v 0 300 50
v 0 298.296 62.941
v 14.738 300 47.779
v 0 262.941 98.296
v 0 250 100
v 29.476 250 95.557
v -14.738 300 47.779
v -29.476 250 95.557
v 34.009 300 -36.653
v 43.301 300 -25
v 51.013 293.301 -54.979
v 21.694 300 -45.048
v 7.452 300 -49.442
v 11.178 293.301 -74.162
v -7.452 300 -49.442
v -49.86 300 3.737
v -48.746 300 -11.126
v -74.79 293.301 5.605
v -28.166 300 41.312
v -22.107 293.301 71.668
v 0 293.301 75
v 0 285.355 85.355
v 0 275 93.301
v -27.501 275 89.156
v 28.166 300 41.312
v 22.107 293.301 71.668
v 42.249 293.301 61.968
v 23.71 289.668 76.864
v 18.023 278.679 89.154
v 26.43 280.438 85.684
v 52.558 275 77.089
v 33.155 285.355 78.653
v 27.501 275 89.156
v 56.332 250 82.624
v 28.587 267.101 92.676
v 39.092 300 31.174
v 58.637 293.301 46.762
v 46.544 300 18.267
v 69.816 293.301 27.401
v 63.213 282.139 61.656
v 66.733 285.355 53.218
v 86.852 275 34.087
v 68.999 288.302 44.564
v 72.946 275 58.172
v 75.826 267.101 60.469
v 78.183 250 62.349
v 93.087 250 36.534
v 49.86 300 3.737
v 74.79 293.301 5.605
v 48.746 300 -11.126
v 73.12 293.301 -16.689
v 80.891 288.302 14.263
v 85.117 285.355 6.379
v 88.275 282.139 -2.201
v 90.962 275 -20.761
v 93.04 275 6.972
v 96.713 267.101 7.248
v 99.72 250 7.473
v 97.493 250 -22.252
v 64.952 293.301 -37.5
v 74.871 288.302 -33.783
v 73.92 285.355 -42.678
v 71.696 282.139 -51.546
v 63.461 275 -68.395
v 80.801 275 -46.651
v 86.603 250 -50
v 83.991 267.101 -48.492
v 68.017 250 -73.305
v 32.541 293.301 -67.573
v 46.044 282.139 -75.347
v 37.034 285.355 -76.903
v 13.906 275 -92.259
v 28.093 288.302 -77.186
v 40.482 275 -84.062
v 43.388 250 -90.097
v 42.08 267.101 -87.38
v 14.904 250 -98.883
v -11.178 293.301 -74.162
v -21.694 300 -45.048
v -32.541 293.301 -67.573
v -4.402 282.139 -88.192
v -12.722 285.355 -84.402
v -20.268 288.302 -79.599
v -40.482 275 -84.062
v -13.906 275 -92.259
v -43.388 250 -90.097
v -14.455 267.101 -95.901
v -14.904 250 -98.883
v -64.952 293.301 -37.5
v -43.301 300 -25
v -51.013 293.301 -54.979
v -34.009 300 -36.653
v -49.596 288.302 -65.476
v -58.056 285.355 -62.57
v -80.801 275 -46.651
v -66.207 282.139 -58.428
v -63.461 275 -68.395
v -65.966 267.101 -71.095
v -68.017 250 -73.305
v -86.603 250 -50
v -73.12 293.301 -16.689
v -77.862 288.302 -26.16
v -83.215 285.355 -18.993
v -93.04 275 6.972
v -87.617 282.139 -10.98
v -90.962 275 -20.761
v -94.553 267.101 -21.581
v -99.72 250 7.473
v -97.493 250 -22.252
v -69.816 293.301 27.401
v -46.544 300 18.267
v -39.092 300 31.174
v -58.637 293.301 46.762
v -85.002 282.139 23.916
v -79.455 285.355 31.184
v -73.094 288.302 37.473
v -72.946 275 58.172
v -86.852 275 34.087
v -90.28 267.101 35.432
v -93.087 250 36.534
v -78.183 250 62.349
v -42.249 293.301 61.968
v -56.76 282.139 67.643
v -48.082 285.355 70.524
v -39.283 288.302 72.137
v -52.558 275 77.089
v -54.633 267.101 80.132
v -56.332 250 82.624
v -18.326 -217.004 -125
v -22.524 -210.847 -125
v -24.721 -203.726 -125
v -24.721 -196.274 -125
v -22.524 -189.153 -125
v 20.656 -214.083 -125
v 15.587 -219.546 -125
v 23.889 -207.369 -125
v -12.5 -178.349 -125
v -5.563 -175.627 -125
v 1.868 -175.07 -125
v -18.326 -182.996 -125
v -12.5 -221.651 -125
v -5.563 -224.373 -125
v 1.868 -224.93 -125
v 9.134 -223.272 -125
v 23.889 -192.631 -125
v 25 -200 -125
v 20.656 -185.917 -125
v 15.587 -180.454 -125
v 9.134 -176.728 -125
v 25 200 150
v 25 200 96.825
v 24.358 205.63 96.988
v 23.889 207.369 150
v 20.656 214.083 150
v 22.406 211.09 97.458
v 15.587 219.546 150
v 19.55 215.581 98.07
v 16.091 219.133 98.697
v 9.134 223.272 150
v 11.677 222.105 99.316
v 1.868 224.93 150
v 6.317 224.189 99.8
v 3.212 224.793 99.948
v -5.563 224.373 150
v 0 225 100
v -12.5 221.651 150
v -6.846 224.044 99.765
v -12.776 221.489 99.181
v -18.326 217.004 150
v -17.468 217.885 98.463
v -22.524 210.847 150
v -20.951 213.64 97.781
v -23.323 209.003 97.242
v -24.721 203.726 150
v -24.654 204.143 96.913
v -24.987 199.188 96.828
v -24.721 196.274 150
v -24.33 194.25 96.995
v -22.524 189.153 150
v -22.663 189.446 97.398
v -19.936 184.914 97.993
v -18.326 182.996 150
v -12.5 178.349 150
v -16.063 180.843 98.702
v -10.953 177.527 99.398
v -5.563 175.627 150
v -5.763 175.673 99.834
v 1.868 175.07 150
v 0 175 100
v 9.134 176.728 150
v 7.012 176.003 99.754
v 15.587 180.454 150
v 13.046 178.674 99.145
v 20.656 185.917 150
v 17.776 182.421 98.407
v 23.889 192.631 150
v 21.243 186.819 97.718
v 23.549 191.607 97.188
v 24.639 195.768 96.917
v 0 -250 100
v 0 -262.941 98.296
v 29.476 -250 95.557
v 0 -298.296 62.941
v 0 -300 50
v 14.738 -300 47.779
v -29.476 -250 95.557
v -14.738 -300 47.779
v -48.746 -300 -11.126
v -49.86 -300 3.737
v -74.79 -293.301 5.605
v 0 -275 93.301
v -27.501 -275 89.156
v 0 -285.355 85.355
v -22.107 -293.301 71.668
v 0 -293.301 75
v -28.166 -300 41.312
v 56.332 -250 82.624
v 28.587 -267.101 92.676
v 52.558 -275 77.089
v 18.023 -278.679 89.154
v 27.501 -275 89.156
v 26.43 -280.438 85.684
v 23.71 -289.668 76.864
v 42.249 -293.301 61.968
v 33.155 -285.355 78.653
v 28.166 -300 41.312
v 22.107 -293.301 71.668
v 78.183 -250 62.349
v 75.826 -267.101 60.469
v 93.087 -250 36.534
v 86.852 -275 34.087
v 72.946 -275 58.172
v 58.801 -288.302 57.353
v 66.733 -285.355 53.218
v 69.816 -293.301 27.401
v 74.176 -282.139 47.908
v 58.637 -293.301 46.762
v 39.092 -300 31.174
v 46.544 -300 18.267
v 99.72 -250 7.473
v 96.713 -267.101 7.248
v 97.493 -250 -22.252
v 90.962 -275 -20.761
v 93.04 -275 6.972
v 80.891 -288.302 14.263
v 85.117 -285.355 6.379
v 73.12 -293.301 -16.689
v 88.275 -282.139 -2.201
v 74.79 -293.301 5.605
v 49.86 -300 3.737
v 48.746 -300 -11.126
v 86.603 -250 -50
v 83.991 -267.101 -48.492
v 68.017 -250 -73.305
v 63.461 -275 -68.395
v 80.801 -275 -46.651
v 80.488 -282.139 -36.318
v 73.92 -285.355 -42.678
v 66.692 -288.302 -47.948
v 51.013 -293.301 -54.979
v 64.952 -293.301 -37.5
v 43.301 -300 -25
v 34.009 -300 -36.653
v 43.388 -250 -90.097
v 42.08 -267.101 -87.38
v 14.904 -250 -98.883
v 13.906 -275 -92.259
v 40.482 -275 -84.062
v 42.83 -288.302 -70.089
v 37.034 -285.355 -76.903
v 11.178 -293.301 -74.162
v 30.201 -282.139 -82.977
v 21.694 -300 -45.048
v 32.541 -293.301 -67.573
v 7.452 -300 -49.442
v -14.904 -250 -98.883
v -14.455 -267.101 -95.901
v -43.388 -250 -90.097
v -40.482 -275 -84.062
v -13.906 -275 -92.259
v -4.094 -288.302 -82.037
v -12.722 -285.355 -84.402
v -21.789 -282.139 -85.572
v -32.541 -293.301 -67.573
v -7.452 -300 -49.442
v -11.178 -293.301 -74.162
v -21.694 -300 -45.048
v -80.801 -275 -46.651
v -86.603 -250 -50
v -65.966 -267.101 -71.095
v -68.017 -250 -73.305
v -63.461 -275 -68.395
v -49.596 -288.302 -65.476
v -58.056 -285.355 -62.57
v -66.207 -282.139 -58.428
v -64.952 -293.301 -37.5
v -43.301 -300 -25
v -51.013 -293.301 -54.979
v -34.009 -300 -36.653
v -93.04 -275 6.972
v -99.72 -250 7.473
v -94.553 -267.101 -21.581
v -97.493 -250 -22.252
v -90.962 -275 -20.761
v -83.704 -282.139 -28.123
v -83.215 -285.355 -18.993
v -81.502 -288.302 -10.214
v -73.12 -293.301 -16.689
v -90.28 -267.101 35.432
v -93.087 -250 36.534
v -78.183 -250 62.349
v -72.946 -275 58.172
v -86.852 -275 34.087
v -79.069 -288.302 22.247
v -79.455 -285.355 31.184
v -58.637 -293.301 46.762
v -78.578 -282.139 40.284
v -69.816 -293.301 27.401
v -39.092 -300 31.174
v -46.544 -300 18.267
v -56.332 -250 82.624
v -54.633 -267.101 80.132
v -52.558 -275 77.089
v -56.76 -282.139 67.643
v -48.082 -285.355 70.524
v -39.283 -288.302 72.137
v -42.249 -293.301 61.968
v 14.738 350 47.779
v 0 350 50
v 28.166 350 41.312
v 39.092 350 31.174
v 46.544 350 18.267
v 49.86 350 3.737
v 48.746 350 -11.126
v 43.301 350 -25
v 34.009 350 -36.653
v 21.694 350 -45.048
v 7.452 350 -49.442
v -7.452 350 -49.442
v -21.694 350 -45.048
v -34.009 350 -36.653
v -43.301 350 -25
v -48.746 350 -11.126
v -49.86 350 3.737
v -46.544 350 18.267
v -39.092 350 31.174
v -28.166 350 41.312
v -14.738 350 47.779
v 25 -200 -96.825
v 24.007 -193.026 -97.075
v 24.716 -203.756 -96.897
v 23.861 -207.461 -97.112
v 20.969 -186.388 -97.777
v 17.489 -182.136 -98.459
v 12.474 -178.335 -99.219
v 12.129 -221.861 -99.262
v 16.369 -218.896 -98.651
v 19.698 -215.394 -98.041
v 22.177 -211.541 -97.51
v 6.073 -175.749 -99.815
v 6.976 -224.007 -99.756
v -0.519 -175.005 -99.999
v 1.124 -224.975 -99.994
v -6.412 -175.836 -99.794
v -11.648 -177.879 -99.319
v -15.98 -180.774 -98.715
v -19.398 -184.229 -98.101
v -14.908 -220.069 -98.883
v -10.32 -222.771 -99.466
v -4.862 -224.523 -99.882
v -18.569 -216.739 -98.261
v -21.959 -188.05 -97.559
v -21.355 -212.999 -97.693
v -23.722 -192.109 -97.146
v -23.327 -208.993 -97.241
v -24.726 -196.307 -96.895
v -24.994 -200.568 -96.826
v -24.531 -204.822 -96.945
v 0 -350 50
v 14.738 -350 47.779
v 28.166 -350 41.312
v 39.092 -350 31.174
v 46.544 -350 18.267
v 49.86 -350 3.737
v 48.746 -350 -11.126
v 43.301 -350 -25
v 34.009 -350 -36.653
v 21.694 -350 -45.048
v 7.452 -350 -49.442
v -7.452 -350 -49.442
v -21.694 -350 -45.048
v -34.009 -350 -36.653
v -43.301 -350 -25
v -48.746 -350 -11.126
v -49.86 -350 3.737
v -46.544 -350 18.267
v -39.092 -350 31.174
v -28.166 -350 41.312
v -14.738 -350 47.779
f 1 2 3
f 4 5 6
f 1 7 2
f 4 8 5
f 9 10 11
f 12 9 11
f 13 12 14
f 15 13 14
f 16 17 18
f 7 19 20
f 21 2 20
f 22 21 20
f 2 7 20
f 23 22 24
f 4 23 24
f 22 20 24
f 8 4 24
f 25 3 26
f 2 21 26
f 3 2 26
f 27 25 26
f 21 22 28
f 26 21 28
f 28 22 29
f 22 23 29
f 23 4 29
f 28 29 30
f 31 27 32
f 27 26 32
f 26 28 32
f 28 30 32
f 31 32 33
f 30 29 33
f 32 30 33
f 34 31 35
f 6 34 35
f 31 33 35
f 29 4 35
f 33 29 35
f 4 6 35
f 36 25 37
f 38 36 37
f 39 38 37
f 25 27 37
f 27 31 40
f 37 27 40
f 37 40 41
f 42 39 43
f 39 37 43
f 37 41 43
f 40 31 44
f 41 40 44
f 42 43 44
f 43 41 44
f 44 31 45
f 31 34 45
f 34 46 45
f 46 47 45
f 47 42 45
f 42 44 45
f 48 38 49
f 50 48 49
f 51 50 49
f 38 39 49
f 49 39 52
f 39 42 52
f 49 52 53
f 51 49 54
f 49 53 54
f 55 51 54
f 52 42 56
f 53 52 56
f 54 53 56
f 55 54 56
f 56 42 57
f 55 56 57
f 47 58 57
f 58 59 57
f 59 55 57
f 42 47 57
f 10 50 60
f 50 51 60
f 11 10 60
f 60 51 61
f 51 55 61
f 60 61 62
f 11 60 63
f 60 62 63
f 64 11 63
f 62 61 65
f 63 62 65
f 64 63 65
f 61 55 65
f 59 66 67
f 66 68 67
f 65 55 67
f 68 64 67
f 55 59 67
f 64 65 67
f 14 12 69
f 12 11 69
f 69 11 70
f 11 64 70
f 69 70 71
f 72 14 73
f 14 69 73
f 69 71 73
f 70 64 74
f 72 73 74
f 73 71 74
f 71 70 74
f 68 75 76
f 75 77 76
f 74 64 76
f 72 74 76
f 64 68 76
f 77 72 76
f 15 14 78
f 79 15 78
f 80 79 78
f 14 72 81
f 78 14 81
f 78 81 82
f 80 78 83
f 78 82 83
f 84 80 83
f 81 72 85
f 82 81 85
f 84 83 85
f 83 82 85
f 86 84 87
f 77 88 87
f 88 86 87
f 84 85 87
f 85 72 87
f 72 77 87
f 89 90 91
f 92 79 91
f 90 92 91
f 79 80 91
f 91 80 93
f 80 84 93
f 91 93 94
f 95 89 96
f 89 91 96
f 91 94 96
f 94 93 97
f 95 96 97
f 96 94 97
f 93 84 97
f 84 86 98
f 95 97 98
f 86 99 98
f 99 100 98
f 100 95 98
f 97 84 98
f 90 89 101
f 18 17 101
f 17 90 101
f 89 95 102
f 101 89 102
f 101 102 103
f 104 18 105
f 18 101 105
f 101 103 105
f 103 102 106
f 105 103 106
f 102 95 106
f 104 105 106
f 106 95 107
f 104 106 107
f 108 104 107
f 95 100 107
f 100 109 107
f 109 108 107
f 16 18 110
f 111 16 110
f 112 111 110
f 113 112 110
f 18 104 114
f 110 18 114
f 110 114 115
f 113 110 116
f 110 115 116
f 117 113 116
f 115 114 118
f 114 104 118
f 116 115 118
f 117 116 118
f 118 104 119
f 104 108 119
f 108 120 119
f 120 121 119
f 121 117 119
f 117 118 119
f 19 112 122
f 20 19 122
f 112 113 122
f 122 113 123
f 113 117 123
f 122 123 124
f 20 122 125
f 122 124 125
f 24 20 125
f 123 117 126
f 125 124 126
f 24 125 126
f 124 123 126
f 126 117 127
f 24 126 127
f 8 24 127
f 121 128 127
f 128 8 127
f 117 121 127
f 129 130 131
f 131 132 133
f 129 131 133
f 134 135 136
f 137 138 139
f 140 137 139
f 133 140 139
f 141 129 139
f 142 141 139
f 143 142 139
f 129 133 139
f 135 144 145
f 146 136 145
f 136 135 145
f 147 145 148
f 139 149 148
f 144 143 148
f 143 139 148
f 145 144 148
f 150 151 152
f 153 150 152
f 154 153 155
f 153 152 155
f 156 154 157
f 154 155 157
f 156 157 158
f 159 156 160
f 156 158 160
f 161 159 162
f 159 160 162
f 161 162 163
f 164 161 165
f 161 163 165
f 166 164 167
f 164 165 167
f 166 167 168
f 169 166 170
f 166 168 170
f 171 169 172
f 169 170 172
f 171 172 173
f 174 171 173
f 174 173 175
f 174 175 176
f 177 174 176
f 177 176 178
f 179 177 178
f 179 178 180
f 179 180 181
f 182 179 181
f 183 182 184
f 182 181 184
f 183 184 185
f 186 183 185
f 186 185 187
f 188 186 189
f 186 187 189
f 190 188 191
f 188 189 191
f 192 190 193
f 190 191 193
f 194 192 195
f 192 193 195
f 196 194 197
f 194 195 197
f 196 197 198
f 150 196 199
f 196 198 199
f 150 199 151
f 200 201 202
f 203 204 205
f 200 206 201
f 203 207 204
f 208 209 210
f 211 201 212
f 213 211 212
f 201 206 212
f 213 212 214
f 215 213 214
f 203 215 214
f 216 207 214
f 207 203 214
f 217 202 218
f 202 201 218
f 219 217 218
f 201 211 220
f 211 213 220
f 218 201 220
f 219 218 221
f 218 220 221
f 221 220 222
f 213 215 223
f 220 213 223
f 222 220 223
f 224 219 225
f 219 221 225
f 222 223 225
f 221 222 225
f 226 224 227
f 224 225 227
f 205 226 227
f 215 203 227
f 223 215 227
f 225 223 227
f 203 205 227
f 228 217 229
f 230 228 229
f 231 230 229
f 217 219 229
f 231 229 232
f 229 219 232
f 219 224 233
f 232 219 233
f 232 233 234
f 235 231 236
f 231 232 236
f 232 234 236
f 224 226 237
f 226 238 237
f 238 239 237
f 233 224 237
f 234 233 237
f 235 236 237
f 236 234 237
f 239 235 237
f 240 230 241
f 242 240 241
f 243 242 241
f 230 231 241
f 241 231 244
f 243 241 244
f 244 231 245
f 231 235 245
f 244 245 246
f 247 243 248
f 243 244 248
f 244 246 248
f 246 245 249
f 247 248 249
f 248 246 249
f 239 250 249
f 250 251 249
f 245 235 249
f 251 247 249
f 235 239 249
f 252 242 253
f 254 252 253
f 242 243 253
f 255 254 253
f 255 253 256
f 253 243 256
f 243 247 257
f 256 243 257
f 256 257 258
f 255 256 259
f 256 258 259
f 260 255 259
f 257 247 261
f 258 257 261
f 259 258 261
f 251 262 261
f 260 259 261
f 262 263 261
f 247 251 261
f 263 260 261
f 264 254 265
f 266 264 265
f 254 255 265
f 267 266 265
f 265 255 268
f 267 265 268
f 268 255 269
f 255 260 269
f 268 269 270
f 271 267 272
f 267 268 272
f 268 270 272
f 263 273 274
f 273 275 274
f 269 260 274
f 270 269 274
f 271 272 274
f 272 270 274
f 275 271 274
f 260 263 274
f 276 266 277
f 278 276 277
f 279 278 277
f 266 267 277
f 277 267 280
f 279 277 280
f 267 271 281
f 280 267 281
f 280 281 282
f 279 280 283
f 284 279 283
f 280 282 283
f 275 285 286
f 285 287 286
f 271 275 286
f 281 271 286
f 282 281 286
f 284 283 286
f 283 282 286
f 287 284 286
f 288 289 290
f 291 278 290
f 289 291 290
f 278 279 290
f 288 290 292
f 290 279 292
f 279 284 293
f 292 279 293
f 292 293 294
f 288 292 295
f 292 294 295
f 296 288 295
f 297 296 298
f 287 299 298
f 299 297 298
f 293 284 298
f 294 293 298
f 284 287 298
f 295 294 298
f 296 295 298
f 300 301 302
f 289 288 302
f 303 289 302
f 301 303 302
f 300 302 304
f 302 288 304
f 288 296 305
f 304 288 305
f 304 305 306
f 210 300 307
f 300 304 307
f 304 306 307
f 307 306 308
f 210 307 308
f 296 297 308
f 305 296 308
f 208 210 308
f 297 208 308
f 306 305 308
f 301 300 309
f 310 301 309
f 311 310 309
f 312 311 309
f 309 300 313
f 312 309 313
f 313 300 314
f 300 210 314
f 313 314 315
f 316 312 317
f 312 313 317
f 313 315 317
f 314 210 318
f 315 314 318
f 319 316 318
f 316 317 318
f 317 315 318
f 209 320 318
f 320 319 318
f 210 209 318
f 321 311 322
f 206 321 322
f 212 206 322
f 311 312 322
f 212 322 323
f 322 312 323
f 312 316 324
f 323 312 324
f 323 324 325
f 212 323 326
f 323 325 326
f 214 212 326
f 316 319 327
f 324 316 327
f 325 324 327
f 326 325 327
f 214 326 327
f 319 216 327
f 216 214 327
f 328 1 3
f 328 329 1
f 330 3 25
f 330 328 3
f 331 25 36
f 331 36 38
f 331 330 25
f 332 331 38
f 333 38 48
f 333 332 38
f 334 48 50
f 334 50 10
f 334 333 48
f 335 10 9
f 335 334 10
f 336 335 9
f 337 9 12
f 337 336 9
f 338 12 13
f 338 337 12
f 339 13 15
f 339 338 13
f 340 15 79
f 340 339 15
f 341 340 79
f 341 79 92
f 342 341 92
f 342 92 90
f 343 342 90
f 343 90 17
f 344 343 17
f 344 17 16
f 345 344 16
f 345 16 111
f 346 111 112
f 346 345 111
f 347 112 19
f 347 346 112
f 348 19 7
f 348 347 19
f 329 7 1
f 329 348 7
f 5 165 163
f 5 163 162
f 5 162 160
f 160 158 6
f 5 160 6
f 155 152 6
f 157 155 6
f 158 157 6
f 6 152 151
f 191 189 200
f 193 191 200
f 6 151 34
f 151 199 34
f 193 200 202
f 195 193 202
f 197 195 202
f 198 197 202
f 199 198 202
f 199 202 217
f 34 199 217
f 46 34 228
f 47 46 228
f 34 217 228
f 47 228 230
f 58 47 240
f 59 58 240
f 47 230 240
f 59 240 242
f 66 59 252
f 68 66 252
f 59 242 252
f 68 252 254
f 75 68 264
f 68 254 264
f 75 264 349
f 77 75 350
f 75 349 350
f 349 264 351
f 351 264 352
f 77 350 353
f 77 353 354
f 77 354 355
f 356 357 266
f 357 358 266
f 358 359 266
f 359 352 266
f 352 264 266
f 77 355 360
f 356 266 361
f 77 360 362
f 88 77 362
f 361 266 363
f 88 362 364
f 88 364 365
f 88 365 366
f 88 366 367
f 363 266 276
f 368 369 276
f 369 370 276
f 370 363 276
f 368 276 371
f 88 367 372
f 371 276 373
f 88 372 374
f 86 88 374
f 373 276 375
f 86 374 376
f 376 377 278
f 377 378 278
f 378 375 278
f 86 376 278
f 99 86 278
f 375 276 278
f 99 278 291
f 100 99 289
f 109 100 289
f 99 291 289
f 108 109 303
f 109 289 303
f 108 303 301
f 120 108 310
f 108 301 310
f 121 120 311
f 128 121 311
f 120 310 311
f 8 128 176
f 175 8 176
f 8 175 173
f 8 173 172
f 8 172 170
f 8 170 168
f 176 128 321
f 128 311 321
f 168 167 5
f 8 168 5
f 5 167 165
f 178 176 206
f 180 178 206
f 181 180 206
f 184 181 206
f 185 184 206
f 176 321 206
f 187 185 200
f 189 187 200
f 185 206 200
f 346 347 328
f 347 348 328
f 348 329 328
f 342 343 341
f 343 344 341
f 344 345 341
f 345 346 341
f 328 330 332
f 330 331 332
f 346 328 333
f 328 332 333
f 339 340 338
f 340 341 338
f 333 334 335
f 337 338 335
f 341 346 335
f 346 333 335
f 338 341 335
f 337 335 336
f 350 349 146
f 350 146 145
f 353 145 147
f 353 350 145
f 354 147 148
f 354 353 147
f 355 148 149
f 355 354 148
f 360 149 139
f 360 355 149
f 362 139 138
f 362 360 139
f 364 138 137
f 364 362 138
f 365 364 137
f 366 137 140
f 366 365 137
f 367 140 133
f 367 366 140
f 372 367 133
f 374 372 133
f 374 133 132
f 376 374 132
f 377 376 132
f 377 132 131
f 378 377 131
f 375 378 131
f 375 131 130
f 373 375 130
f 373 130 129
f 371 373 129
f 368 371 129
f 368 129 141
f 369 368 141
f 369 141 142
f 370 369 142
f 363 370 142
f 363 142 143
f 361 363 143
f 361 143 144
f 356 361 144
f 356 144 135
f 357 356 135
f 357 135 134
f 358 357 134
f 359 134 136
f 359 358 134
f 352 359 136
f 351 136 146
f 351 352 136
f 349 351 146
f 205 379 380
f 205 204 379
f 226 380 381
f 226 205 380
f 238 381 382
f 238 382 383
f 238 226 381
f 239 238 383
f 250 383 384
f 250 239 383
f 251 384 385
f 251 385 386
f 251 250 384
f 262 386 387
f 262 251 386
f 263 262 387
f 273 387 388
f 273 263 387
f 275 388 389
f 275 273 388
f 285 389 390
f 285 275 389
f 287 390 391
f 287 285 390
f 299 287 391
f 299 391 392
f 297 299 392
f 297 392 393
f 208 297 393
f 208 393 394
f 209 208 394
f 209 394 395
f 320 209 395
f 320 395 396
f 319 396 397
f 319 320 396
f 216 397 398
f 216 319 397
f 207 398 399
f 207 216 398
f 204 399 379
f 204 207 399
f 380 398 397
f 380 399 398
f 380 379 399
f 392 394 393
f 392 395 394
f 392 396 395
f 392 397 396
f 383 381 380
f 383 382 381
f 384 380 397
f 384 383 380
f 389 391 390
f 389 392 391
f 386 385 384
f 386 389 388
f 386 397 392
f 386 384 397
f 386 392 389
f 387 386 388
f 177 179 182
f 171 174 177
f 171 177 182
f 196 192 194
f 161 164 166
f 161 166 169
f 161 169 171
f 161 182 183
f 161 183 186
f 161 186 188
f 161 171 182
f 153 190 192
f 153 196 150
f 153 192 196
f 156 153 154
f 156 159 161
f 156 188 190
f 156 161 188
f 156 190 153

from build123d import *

# Parameters (mm, degrees)
F0_W     = 50
F0_H     = 50
F2_R     = 25
F3_DEPTH = 150
F4_DEPTH = 125


with BuildPart() as f1:
    # F0 (on Right) → F1 (revolve)
    with BuildSketch(Plane.YZ):
        with Locations((-325, 25)):
            Rectangle(F0_W, F0_H)
        with BuildLine():
            Line((-300, 0), (0, 0))
            Line((0, 0), (300, 0))
            Line((300, 0), (300, 50))
            ThreePointArc((300, 50), (285.355339, 85.355339), (250, 100))
            Line((250, 100), (-250, 100))
            ThreePointArc((-250, 100), (-285.355339, 85.355339), (-300, 50))
            Line((-300, 50), (-300, 0))
        make_face()
        with Locations((325, 25)):
            Rectangle(F0_W, F0_H)
    revolve(axis=Axis((0, 79.503536, 0), (0, 1, 0)))

    # F2 (on Top) → F3 (join)
    with BuildSketch(Plane.XY):
        with Locations((0, 200)):
            Circle(F2_R)
    extrude(amount=F3_DEPTH)

    # F2 (on Top) → F4 (join)
    with BuildSketch(Plane.XY):
        with Locations((0, -200)):
            Circle(F2_R)
    extrude(amount=-F4_DEPTH)


solid = f1.part
